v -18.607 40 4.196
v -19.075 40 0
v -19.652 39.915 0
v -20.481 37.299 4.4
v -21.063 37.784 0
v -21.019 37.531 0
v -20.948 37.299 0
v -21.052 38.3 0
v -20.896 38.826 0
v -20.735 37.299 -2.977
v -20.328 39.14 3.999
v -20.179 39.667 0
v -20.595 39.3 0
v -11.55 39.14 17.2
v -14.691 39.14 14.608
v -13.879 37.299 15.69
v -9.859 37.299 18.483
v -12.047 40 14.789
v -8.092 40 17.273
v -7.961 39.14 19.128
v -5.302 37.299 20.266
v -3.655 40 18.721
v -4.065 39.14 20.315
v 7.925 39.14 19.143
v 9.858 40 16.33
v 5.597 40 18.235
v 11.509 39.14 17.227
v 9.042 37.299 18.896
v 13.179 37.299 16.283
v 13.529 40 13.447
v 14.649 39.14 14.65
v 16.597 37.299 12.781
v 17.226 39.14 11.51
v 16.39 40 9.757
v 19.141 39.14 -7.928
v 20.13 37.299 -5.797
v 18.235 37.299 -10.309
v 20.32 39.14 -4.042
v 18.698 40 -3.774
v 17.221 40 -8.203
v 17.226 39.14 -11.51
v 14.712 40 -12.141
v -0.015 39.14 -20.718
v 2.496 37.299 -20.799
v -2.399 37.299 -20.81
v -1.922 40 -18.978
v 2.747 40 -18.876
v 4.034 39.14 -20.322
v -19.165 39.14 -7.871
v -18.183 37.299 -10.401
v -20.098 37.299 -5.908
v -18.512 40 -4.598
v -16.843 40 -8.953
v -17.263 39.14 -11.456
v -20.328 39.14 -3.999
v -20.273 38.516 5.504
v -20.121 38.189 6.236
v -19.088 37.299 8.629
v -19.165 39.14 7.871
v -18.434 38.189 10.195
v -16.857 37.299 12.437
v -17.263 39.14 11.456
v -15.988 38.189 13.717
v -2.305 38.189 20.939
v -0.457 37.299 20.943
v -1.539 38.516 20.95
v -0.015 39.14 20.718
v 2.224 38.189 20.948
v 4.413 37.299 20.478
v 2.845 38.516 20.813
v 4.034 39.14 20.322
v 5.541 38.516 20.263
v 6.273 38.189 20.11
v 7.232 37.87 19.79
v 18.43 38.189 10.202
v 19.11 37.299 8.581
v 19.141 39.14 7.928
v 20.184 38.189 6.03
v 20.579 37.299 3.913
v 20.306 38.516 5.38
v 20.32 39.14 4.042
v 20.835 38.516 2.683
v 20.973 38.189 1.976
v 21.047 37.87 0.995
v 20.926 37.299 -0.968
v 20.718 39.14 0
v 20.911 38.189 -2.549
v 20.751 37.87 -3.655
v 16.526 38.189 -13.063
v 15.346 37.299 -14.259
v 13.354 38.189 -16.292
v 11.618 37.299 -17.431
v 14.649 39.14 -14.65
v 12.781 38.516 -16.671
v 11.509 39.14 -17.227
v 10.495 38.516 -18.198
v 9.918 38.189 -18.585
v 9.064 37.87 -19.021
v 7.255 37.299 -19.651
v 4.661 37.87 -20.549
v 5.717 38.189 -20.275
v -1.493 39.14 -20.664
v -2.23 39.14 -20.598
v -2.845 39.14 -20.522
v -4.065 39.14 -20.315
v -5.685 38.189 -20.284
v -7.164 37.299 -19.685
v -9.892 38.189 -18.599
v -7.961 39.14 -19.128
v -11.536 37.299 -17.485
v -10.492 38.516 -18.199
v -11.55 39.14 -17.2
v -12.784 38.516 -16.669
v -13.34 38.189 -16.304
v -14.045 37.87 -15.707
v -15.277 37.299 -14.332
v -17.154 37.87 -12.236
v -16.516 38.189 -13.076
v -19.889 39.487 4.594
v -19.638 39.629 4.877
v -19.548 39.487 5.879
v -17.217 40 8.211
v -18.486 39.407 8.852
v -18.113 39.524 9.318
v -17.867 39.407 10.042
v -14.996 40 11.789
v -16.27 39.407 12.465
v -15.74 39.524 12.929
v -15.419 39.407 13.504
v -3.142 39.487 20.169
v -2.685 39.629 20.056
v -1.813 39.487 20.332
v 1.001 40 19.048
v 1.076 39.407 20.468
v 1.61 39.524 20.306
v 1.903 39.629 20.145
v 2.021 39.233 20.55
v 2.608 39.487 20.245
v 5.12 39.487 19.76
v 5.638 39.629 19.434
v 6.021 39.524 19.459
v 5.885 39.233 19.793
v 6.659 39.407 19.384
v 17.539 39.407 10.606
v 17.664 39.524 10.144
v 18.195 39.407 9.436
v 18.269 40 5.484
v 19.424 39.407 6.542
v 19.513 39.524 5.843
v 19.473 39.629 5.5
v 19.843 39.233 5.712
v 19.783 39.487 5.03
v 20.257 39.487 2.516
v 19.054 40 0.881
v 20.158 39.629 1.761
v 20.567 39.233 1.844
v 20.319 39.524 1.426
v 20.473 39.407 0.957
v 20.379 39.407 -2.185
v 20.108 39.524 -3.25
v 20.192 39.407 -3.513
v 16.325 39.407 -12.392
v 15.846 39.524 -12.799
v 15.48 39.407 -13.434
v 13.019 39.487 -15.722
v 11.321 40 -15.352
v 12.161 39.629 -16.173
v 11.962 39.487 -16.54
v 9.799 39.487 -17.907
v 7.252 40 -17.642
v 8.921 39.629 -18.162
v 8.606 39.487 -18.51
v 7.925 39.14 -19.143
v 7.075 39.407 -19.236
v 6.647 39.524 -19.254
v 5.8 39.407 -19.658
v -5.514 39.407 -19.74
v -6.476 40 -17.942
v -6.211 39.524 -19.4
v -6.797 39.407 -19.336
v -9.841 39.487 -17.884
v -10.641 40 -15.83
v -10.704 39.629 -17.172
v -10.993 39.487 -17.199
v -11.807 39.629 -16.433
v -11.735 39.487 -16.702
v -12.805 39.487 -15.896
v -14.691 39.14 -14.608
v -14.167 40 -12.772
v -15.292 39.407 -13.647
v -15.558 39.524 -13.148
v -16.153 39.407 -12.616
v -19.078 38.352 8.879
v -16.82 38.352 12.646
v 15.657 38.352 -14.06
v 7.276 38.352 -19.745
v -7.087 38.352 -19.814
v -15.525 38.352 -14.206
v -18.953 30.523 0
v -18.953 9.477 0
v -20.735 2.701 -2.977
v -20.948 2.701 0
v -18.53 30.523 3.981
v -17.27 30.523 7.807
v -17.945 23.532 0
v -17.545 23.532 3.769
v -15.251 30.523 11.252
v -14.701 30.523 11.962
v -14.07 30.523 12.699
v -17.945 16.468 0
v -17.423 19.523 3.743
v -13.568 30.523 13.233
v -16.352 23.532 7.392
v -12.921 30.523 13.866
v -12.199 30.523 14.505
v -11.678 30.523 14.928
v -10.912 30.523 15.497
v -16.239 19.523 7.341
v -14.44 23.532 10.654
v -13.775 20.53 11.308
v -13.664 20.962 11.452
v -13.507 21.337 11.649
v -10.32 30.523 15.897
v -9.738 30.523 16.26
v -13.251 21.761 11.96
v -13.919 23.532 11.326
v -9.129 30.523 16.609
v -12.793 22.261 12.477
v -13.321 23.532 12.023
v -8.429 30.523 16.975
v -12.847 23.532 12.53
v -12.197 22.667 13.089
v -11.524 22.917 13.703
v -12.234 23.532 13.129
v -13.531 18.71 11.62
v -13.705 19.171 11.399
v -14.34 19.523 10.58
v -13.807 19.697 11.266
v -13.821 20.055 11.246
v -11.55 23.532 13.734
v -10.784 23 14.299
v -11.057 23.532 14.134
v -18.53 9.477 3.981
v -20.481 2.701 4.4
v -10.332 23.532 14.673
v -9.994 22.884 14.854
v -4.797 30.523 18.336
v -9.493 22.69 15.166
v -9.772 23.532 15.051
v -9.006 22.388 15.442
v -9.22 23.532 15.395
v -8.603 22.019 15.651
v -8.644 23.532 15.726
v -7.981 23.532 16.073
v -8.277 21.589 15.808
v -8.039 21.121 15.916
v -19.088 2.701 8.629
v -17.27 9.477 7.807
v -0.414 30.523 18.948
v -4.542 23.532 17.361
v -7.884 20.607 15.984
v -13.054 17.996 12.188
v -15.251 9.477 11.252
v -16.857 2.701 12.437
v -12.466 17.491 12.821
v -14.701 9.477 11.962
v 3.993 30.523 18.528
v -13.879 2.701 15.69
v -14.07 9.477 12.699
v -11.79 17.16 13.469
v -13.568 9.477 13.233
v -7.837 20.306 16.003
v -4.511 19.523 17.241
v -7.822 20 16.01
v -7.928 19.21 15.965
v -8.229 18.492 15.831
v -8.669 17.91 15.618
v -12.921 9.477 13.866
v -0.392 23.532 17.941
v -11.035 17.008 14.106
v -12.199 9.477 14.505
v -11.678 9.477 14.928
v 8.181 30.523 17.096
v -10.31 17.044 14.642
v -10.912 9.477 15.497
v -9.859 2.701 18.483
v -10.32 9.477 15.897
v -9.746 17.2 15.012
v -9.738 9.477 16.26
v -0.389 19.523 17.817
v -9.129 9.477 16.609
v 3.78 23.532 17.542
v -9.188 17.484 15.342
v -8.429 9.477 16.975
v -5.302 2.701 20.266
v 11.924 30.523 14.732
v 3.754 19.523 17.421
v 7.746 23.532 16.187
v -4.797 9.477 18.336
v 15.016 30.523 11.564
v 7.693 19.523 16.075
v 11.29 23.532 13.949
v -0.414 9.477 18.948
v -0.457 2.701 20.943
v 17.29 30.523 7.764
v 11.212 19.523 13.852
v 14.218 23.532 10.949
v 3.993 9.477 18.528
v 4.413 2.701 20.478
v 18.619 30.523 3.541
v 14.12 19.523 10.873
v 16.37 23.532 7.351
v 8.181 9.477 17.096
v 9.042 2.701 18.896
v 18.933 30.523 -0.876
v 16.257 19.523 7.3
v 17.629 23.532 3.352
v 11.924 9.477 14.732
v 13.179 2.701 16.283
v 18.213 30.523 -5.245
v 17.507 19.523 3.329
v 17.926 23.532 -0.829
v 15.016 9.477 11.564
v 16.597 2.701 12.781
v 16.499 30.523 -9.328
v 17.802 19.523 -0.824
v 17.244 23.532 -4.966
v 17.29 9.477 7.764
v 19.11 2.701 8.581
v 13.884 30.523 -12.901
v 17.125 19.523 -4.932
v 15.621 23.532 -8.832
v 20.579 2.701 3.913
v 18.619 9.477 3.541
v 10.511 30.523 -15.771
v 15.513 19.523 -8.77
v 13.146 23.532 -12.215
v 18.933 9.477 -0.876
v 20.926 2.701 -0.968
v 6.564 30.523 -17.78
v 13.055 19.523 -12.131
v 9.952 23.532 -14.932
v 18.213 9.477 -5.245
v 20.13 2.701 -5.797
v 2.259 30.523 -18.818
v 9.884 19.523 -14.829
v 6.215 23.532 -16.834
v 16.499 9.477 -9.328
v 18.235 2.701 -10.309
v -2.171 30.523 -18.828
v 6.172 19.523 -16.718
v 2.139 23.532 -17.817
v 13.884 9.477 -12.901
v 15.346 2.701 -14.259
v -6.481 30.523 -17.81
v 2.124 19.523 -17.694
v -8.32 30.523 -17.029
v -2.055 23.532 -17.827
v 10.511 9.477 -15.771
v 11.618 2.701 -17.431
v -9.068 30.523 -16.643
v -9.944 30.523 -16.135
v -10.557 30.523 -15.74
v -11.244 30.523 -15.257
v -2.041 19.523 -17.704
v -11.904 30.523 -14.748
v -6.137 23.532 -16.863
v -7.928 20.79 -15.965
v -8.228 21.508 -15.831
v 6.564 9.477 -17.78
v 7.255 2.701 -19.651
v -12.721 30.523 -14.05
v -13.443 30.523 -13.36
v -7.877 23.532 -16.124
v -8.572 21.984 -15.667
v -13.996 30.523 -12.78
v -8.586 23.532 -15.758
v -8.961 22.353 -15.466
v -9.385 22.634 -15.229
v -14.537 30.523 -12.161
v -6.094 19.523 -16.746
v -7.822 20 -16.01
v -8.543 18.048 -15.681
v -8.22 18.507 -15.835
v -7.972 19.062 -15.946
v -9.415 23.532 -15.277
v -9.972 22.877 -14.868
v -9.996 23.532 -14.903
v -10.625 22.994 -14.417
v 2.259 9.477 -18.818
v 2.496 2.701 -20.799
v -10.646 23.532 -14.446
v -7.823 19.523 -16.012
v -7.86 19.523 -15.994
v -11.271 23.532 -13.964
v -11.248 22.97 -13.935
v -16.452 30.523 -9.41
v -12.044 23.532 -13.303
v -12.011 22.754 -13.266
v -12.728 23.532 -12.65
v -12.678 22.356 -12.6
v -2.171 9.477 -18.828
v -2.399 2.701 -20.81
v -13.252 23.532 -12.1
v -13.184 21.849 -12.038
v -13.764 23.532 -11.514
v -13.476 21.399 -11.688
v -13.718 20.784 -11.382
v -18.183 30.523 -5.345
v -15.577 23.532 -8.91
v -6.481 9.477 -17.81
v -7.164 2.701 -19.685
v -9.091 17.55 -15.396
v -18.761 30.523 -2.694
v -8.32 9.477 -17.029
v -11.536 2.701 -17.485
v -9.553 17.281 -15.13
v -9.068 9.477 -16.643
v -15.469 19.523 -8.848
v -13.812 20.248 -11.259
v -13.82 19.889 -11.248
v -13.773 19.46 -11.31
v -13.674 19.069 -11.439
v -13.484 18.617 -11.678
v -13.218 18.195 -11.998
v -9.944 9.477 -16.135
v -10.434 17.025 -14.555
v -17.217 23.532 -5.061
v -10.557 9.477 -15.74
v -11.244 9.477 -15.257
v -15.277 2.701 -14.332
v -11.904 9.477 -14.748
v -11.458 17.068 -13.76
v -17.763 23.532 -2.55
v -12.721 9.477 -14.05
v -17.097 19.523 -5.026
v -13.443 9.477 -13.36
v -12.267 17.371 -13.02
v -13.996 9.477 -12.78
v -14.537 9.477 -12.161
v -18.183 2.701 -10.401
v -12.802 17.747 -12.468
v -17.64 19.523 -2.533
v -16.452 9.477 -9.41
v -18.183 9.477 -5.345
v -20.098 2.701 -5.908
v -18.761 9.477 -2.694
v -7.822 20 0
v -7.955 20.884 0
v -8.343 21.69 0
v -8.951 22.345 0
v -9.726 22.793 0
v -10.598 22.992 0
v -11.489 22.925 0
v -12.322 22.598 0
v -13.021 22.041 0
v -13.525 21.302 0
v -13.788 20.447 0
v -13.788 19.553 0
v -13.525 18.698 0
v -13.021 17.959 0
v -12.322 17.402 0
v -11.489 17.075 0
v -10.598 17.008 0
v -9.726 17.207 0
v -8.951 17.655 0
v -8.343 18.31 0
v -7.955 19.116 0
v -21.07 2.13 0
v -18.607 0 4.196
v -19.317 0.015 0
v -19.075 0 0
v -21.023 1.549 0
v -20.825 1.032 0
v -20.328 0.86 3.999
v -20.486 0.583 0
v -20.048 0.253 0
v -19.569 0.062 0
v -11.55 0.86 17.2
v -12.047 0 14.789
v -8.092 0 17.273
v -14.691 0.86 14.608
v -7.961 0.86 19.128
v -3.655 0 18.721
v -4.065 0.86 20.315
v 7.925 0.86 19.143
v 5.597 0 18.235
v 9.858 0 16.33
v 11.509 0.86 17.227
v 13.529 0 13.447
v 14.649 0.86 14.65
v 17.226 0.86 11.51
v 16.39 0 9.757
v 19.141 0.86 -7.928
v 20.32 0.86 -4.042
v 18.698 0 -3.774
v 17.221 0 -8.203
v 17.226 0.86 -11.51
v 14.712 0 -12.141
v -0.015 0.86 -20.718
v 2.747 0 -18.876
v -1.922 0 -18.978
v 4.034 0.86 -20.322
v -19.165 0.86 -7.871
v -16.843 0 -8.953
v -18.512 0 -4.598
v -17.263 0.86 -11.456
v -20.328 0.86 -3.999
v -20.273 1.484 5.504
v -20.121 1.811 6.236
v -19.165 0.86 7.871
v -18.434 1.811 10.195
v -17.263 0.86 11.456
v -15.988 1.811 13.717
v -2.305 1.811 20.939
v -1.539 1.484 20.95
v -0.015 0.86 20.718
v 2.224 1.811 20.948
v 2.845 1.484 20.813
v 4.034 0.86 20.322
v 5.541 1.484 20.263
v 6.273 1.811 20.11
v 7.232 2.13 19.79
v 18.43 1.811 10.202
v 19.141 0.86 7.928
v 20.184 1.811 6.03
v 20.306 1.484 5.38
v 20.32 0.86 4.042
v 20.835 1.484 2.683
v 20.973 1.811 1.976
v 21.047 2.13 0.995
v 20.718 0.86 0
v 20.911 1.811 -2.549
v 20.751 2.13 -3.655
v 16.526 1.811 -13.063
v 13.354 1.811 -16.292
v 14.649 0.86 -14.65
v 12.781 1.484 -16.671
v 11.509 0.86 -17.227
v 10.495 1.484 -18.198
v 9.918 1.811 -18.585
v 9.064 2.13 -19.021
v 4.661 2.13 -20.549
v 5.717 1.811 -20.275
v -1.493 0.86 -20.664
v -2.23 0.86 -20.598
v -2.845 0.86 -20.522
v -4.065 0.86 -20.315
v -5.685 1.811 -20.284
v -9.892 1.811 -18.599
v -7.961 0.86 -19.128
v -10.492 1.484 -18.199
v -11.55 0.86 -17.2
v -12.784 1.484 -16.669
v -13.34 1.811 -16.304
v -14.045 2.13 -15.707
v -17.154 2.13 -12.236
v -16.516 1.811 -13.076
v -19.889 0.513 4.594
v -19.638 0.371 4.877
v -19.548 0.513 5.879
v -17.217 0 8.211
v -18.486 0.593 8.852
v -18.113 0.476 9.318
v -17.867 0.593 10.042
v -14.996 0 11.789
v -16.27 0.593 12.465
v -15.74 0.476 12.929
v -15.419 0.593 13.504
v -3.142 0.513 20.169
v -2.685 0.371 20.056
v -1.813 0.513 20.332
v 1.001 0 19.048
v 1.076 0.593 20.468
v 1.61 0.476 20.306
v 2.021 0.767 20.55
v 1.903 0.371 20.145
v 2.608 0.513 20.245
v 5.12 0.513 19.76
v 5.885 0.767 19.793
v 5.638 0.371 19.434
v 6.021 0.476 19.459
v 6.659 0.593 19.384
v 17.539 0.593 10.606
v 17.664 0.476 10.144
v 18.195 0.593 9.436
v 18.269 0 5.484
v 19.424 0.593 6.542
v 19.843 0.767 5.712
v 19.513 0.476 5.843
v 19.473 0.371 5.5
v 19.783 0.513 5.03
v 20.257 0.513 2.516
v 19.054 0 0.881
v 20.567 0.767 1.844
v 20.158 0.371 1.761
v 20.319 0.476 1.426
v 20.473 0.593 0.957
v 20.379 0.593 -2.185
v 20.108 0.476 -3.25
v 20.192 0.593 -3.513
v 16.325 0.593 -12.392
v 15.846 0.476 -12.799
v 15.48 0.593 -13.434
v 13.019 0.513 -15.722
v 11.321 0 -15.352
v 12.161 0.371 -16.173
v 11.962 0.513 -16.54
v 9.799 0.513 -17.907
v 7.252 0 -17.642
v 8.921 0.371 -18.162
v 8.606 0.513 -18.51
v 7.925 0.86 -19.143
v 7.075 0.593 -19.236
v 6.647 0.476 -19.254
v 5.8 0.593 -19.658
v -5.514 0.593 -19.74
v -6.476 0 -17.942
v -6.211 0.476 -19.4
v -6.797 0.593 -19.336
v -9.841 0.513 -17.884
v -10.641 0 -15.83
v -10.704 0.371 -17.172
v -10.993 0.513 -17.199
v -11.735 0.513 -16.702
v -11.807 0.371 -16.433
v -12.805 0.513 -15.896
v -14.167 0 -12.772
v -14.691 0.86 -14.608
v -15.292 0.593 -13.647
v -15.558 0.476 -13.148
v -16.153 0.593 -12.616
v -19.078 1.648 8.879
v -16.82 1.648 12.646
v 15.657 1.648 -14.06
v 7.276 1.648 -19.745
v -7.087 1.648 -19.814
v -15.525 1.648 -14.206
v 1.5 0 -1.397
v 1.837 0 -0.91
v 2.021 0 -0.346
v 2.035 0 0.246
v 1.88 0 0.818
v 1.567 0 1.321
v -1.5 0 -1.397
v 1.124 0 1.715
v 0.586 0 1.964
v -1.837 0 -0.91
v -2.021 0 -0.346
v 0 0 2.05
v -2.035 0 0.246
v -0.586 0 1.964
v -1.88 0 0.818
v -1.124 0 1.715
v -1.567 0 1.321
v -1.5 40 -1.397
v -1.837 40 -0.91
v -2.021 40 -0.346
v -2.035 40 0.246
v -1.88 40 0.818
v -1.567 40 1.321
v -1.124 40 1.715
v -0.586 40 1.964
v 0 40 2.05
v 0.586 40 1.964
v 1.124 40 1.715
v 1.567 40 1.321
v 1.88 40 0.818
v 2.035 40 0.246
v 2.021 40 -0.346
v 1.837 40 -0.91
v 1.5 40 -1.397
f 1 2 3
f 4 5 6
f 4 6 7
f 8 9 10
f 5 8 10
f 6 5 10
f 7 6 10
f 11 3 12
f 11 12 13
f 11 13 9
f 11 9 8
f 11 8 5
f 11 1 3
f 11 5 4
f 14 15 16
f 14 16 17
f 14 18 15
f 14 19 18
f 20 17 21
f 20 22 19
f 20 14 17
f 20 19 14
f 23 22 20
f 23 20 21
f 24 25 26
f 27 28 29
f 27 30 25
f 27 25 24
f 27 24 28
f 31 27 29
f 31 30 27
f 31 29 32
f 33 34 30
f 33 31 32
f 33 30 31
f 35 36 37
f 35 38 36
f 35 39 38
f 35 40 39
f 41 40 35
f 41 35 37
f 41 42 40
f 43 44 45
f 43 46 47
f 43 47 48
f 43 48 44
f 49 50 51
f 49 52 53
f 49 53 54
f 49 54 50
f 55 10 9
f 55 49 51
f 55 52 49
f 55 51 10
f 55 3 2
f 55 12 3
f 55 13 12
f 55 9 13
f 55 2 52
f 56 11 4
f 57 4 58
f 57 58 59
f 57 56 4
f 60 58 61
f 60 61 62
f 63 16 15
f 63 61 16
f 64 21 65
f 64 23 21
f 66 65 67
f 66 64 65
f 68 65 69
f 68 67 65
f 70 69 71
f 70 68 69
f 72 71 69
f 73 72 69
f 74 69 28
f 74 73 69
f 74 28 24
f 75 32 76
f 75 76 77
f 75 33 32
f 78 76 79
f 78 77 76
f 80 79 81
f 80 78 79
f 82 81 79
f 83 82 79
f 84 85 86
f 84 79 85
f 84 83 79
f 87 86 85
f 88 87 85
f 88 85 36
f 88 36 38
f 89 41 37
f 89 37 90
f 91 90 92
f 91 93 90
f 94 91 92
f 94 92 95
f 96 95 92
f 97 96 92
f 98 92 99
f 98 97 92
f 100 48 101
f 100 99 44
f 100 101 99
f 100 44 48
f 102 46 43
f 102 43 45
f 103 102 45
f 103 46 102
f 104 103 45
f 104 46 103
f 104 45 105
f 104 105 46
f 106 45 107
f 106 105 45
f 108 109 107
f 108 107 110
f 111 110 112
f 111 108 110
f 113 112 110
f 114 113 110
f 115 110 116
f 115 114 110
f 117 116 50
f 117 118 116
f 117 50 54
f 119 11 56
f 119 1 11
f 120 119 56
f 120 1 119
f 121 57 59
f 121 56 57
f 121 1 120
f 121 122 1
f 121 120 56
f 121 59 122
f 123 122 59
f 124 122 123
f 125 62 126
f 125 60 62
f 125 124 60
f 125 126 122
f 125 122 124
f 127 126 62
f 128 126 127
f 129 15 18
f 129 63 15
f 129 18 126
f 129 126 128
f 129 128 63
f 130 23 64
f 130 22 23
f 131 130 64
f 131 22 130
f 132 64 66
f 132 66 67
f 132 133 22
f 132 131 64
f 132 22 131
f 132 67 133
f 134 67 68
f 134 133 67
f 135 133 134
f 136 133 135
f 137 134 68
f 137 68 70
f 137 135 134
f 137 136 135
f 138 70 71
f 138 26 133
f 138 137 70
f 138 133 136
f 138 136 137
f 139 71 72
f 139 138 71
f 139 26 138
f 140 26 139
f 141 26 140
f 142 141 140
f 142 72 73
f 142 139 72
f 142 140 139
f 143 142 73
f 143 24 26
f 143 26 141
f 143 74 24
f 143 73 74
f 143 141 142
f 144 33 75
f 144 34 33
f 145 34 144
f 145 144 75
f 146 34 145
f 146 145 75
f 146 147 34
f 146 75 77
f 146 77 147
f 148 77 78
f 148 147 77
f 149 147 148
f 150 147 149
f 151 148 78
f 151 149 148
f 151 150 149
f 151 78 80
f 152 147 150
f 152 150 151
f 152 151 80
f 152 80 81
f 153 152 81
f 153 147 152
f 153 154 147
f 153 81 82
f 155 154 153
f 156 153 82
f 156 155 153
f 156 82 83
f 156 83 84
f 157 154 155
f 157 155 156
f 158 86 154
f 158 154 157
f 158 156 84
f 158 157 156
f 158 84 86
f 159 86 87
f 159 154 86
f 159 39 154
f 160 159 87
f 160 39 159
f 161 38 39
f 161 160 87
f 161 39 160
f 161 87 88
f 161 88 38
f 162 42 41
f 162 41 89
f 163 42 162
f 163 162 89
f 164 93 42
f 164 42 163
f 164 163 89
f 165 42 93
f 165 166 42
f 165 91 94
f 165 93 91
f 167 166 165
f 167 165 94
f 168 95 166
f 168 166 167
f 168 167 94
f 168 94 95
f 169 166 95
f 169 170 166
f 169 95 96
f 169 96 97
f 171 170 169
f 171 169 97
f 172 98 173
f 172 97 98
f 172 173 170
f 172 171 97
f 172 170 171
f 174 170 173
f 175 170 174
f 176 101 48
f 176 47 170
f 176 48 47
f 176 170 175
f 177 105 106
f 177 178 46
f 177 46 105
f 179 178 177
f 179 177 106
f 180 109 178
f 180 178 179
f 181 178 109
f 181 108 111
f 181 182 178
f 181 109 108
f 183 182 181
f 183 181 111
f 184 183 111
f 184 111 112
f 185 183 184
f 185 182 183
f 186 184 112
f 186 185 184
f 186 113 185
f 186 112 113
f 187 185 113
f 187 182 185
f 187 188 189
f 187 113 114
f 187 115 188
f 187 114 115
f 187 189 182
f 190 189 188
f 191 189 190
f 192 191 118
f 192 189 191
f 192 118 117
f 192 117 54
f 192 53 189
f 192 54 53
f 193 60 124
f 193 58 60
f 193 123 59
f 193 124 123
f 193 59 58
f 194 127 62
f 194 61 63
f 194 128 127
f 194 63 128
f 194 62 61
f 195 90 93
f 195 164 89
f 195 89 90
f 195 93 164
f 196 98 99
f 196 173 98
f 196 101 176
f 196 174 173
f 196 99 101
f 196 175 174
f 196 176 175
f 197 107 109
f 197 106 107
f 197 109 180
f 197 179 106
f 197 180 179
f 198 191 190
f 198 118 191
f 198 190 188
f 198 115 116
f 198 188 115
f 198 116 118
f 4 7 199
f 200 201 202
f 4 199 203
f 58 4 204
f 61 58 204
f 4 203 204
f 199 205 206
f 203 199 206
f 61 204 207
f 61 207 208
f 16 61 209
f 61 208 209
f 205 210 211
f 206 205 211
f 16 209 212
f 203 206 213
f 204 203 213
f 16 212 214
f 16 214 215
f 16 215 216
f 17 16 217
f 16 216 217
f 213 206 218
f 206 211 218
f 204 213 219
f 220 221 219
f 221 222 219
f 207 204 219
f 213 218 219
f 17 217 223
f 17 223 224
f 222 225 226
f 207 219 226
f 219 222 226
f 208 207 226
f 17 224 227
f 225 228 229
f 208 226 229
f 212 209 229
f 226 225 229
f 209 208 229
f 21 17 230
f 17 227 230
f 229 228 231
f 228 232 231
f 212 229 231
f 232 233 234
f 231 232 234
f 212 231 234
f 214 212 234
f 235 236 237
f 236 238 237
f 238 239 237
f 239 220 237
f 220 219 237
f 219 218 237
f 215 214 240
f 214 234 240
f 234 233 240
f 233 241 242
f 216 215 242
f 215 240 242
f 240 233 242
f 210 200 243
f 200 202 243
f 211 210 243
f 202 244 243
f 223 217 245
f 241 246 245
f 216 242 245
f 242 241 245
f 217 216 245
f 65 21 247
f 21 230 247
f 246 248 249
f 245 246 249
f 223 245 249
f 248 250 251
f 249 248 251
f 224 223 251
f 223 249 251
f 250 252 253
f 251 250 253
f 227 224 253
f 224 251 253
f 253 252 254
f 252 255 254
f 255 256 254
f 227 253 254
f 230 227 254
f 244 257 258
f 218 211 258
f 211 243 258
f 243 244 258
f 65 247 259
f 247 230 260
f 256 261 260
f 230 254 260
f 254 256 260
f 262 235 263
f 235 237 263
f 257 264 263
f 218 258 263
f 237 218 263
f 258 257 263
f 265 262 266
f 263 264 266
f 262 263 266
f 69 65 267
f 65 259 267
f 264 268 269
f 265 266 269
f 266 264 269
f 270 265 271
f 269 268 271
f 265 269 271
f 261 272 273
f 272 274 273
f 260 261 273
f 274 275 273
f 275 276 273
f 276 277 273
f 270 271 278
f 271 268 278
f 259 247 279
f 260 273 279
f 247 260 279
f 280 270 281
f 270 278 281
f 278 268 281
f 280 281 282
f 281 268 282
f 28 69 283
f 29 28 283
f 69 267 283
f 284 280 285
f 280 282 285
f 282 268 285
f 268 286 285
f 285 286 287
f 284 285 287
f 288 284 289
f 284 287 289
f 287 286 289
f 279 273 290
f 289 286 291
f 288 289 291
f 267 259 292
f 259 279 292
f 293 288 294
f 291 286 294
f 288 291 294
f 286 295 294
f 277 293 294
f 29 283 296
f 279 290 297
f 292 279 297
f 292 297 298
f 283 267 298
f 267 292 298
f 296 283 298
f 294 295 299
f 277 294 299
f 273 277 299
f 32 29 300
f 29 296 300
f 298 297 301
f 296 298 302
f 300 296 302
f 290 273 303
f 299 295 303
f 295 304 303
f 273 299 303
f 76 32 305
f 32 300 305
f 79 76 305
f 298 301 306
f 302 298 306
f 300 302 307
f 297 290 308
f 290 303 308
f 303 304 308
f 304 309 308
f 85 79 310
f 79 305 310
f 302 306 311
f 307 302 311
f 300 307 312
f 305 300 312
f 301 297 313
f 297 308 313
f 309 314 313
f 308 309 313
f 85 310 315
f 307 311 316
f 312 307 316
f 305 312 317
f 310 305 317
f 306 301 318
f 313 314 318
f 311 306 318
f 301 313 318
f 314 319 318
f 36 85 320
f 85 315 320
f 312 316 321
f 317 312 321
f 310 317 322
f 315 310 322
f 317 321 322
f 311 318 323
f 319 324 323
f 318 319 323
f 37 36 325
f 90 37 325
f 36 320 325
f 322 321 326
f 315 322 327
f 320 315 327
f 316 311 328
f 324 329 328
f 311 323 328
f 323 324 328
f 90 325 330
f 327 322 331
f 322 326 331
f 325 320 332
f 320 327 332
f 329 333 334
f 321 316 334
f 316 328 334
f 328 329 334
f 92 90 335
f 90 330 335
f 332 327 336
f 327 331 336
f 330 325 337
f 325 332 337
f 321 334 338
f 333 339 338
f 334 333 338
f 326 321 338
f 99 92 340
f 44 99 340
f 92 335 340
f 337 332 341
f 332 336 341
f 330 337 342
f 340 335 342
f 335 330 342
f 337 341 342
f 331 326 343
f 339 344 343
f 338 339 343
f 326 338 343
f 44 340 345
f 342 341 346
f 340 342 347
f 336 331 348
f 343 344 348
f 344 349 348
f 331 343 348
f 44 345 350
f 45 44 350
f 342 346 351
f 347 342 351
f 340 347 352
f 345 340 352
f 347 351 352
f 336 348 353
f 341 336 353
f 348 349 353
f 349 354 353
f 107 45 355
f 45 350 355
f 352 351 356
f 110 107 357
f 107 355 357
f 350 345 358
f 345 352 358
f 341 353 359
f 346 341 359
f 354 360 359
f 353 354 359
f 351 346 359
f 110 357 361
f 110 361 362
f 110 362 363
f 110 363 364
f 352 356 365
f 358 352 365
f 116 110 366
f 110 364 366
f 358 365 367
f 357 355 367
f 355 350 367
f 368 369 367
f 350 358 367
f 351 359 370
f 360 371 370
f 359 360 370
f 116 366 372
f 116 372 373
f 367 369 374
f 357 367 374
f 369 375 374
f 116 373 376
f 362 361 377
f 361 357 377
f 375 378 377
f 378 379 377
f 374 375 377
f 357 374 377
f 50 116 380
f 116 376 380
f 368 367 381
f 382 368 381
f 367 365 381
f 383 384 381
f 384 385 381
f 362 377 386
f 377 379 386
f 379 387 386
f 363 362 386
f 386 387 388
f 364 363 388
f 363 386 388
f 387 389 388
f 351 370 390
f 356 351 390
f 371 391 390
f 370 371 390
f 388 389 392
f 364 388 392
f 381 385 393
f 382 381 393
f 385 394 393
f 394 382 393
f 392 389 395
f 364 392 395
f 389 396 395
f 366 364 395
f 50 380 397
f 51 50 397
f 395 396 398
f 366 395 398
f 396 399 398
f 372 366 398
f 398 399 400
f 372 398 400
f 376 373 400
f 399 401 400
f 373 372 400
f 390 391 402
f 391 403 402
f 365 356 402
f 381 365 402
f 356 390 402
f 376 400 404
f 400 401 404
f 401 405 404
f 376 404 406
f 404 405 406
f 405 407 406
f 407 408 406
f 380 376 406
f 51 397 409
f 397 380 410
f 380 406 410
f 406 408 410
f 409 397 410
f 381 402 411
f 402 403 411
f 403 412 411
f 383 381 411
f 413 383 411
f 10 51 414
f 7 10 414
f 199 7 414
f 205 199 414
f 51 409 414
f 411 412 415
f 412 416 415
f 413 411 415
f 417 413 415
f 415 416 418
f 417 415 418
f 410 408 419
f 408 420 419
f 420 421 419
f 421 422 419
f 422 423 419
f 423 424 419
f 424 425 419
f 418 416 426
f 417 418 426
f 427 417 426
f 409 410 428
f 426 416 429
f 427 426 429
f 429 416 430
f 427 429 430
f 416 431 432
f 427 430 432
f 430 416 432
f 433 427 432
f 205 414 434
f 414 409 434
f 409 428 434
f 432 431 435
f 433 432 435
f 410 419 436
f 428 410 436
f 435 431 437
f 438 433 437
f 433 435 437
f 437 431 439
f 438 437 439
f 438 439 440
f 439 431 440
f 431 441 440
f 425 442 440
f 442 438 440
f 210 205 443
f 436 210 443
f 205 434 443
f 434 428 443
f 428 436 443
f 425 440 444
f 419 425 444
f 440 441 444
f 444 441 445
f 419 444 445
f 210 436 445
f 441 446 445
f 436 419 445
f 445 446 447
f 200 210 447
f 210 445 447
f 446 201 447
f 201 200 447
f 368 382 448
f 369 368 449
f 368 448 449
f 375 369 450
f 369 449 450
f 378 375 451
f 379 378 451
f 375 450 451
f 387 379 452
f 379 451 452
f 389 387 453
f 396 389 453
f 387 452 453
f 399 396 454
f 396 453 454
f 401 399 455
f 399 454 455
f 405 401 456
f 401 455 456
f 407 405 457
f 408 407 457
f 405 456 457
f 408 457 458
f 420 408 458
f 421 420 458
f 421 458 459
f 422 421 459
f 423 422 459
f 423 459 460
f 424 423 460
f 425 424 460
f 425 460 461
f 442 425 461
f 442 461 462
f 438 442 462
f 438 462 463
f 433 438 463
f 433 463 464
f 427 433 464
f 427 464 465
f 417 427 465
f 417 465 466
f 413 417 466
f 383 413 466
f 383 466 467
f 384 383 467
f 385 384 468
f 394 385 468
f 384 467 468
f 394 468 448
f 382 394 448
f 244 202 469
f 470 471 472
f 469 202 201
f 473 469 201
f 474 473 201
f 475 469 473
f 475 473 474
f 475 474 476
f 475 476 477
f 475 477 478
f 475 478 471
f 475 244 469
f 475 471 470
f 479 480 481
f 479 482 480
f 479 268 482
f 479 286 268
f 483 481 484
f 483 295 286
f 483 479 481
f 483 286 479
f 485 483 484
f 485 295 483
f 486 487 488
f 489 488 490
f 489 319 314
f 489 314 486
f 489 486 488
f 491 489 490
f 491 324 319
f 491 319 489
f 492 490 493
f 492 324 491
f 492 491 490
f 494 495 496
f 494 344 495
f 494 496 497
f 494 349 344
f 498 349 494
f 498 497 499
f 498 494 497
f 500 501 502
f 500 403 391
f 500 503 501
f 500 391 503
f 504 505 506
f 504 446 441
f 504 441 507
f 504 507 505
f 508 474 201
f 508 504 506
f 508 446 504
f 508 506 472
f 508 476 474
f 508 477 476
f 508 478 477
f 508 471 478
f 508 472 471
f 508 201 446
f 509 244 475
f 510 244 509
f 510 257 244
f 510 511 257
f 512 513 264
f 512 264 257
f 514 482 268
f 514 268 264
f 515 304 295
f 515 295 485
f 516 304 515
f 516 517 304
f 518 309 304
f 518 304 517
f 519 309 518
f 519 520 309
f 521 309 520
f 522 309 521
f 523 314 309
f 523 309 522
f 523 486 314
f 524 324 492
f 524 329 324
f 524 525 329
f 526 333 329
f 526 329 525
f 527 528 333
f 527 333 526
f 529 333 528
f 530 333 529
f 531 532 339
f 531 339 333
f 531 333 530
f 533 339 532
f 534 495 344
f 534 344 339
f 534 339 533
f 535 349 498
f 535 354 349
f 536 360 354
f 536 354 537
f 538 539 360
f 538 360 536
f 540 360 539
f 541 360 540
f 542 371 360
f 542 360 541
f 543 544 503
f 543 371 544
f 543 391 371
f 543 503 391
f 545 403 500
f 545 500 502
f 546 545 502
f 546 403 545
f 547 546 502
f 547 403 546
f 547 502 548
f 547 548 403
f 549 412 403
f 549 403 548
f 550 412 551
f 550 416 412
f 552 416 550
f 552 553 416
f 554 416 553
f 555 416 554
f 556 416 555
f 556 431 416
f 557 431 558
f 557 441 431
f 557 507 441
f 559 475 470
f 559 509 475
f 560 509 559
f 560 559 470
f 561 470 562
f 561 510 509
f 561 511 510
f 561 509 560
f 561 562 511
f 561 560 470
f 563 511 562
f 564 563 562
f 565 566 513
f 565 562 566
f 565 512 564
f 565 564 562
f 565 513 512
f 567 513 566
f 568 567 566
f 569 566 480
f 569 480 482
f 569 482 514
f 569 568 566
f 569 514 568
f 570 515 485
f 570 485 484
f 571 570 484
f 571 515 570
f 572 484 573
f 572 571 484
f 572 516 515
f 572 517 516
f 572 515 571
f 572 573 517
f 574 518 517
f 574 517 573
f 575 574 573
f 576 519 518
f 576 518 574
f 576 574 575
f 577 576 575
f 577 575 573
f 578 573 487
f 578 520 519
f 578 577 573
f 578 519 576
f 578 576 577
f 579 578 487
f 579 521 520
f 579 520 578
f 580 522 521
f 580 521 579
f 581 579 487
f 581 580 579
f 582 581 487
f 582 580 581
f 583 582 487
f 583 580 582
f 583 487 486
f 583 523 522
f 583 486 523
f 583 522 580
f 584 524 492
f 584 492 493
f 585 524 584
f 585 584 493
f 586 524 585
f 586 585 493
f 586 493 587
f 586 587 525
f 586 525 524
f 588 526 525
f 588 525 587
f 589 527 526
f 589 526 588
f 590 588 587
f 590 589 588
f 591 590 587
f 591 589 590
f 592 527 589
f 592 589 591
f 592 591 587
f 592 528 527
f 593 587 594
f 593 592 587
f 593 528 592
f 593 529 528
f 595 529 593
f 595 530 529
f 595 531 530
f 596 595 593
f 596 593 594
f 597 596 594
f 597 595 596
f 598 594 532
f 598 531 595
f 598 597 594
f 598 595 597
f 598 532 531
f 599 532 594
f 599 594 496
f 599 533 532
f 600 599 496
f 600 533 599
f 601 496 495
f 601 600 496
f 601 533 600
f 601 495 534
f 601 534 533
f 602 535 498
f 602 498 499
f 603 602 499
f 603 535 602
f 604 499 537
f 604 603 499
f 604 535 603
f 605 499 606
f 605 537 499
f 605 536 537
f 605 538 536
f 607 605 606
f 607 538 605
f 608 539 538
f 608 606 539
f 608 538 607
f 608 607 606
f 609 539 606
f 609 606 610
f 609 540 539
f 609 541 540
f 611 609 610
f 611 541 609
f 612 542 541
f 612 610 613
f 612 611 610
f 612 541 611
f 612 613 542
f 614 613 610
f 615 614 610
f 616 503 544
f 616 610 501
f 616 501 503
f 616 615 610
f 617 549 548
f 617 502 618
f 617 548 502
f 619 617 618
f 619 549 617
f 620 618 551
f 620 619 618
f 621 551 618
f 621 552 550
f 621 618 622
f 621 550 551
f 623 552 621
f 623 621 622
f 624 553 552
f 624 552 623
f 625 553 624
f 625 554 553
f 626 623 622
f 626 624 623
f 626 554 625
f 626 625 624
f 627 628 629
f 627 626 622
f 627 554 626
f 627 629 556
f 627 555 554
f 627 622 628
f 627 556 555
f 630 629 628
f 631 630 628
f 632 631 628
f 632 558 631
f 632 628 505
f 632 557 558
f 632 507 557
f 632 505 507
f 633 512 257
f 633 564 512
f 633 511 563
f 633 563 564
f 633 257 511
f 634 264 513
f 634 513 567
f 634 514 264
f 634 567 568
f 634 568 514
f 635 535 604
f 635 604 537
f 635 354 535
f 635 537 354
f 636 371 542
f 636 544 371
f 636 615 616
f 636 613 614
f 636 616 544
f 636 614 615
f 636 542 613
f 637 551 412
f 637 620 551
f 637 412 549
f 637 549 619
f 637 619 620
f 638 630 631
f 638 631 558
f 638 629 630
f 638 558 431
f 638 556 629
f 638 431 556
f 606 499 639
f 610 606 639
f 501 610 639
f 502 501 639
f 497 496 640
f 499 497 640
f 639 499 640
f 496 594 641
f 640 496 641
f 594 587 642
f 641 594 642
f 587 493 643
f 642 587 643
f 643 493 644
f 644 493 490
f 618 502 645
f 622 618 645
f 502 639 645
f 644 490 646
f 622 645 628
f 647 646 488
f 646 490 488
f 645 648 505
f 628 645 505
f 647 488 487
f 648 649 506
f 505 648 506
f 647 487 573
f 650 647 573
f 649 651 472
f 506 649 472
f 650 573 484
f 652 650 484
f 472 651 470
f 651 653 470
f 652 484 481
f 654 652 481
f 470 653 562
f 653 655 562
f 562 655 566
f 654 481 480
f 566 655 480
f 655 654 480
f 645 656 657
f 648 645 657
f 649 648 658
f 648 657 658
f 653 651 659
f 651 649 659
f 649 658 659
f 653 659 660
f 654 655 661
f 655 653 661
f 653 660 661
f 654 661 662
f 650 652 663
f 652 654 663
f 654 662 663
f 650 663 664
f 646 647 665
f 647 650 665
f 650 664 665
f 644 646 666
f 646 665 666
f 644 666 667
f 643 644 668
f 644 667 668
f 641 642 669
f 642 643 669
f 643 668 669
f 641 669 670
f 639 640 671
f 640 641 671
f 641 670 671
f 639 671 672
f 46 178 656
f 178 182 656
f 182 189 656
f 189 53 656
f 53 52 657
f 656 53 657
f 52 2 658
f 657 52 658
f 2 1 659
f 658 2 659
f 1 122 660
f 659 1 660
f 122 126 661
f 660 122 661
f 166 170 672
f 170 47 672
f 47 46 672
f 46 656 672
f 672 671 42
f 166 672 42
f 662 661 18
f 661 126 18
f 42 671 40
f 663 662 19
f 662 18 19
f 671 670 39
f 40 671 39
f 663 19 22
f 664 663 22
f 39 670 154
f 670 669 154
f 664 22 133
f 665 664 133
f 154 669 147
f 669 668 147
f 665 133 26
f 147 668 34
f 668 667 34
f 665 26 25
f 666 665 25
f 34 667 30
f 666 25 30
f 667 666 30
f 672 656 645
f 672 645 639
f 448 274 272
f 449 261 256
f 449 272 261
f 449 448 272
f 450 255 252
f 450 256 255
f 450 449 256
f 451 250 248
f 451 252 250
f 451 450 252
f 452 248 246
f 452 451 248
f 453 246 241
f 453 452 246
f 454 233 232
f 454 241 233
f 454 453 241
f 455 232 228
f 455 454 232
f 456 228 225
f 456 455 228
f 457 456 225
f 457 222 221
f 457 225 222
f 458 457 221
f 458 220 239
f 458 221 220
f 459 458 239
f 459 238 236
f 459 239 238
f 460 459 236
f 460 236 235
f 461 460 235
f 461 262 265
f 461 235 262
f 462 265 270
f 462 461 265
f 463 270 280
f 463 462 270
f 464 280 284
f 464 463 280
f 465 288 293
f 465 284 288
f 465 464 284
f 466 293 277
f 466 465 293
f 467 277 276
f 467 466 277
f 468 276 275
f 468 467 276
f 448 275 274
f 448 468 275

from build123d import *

# Parameters (mm, degrees)
CONG_1_R                     = 2
BOSS_EXTRU_1_DEPTH           = 40
ESQUISSE3_R                  = 3
ENL_V_MAT_EXTRU_1_DEPTH      = 22.074664225
ENL_V_MAT_EXTRU_1_DEPTH_BACK = 22.074664225


with BuildPart() as part:
    # Esquisse1 → Révolution1 (revolve)
    with BuildSketch(Plane.XY):
        with BuildLine():
            Line((-2.05, 0), (-2.05, 40))
            Line((-2.05, 40), (-22.05, 40))
            ThreePointArc((-22.05, 40), (-17.818604845, 20), (-22.05, 0))
            Line((-22.05, 0), (-2.05, 0))
        make_face()
    revolve(axis=Axis((0, 0, 0), (0, 1, 0)))

    # Congé1
    cong_1_edges = [part.edges().sort_by_distance(p)[0] for p in [
        (22.05, 40, 0),
        (22.05, 0, 0),
    ]]
    fillet(cong_1_edges, radius=CONG_1_R)

    # Esquisse2 → Boss.-Extru.1 (add)
    with BuildSketch(Plane(origin=(0, 40, 0), x_dir=(1, 0, 0), z_dir=(0, 1, 0))):
        with BuildLine():
            Line((-1.5, 1.397318861), (1.5, 1.397318861))
            ThreePointArc((1.5, 1.397318861), (0, 2.05), (-1.5, 1.397318861))
        make_face()
    extrude(amount=-BOSS_EXTRU_1_DEPTH)

    # Esquisse3 → Enlèv. mat.-Extru.1 (cut, two sides)
    with BuildSketch(Plane.XY) as enl_v_mat_extru_1_sk:
        with Locations((-10.821847214, 20)):
            Circle(ESQUISSE3_R)
    extrude(amount=ENL_V_MAT_EXTRU_1_DEPTH, mode=Mode.SUBTRACT)
    extrude(enl_v_mat_extru_1_sk.sketch, amount=-ENL_V_MAT_EXTRU_1_DEPTH_BACK, mode=Mode.SUBTRACT)


solid = part.part
